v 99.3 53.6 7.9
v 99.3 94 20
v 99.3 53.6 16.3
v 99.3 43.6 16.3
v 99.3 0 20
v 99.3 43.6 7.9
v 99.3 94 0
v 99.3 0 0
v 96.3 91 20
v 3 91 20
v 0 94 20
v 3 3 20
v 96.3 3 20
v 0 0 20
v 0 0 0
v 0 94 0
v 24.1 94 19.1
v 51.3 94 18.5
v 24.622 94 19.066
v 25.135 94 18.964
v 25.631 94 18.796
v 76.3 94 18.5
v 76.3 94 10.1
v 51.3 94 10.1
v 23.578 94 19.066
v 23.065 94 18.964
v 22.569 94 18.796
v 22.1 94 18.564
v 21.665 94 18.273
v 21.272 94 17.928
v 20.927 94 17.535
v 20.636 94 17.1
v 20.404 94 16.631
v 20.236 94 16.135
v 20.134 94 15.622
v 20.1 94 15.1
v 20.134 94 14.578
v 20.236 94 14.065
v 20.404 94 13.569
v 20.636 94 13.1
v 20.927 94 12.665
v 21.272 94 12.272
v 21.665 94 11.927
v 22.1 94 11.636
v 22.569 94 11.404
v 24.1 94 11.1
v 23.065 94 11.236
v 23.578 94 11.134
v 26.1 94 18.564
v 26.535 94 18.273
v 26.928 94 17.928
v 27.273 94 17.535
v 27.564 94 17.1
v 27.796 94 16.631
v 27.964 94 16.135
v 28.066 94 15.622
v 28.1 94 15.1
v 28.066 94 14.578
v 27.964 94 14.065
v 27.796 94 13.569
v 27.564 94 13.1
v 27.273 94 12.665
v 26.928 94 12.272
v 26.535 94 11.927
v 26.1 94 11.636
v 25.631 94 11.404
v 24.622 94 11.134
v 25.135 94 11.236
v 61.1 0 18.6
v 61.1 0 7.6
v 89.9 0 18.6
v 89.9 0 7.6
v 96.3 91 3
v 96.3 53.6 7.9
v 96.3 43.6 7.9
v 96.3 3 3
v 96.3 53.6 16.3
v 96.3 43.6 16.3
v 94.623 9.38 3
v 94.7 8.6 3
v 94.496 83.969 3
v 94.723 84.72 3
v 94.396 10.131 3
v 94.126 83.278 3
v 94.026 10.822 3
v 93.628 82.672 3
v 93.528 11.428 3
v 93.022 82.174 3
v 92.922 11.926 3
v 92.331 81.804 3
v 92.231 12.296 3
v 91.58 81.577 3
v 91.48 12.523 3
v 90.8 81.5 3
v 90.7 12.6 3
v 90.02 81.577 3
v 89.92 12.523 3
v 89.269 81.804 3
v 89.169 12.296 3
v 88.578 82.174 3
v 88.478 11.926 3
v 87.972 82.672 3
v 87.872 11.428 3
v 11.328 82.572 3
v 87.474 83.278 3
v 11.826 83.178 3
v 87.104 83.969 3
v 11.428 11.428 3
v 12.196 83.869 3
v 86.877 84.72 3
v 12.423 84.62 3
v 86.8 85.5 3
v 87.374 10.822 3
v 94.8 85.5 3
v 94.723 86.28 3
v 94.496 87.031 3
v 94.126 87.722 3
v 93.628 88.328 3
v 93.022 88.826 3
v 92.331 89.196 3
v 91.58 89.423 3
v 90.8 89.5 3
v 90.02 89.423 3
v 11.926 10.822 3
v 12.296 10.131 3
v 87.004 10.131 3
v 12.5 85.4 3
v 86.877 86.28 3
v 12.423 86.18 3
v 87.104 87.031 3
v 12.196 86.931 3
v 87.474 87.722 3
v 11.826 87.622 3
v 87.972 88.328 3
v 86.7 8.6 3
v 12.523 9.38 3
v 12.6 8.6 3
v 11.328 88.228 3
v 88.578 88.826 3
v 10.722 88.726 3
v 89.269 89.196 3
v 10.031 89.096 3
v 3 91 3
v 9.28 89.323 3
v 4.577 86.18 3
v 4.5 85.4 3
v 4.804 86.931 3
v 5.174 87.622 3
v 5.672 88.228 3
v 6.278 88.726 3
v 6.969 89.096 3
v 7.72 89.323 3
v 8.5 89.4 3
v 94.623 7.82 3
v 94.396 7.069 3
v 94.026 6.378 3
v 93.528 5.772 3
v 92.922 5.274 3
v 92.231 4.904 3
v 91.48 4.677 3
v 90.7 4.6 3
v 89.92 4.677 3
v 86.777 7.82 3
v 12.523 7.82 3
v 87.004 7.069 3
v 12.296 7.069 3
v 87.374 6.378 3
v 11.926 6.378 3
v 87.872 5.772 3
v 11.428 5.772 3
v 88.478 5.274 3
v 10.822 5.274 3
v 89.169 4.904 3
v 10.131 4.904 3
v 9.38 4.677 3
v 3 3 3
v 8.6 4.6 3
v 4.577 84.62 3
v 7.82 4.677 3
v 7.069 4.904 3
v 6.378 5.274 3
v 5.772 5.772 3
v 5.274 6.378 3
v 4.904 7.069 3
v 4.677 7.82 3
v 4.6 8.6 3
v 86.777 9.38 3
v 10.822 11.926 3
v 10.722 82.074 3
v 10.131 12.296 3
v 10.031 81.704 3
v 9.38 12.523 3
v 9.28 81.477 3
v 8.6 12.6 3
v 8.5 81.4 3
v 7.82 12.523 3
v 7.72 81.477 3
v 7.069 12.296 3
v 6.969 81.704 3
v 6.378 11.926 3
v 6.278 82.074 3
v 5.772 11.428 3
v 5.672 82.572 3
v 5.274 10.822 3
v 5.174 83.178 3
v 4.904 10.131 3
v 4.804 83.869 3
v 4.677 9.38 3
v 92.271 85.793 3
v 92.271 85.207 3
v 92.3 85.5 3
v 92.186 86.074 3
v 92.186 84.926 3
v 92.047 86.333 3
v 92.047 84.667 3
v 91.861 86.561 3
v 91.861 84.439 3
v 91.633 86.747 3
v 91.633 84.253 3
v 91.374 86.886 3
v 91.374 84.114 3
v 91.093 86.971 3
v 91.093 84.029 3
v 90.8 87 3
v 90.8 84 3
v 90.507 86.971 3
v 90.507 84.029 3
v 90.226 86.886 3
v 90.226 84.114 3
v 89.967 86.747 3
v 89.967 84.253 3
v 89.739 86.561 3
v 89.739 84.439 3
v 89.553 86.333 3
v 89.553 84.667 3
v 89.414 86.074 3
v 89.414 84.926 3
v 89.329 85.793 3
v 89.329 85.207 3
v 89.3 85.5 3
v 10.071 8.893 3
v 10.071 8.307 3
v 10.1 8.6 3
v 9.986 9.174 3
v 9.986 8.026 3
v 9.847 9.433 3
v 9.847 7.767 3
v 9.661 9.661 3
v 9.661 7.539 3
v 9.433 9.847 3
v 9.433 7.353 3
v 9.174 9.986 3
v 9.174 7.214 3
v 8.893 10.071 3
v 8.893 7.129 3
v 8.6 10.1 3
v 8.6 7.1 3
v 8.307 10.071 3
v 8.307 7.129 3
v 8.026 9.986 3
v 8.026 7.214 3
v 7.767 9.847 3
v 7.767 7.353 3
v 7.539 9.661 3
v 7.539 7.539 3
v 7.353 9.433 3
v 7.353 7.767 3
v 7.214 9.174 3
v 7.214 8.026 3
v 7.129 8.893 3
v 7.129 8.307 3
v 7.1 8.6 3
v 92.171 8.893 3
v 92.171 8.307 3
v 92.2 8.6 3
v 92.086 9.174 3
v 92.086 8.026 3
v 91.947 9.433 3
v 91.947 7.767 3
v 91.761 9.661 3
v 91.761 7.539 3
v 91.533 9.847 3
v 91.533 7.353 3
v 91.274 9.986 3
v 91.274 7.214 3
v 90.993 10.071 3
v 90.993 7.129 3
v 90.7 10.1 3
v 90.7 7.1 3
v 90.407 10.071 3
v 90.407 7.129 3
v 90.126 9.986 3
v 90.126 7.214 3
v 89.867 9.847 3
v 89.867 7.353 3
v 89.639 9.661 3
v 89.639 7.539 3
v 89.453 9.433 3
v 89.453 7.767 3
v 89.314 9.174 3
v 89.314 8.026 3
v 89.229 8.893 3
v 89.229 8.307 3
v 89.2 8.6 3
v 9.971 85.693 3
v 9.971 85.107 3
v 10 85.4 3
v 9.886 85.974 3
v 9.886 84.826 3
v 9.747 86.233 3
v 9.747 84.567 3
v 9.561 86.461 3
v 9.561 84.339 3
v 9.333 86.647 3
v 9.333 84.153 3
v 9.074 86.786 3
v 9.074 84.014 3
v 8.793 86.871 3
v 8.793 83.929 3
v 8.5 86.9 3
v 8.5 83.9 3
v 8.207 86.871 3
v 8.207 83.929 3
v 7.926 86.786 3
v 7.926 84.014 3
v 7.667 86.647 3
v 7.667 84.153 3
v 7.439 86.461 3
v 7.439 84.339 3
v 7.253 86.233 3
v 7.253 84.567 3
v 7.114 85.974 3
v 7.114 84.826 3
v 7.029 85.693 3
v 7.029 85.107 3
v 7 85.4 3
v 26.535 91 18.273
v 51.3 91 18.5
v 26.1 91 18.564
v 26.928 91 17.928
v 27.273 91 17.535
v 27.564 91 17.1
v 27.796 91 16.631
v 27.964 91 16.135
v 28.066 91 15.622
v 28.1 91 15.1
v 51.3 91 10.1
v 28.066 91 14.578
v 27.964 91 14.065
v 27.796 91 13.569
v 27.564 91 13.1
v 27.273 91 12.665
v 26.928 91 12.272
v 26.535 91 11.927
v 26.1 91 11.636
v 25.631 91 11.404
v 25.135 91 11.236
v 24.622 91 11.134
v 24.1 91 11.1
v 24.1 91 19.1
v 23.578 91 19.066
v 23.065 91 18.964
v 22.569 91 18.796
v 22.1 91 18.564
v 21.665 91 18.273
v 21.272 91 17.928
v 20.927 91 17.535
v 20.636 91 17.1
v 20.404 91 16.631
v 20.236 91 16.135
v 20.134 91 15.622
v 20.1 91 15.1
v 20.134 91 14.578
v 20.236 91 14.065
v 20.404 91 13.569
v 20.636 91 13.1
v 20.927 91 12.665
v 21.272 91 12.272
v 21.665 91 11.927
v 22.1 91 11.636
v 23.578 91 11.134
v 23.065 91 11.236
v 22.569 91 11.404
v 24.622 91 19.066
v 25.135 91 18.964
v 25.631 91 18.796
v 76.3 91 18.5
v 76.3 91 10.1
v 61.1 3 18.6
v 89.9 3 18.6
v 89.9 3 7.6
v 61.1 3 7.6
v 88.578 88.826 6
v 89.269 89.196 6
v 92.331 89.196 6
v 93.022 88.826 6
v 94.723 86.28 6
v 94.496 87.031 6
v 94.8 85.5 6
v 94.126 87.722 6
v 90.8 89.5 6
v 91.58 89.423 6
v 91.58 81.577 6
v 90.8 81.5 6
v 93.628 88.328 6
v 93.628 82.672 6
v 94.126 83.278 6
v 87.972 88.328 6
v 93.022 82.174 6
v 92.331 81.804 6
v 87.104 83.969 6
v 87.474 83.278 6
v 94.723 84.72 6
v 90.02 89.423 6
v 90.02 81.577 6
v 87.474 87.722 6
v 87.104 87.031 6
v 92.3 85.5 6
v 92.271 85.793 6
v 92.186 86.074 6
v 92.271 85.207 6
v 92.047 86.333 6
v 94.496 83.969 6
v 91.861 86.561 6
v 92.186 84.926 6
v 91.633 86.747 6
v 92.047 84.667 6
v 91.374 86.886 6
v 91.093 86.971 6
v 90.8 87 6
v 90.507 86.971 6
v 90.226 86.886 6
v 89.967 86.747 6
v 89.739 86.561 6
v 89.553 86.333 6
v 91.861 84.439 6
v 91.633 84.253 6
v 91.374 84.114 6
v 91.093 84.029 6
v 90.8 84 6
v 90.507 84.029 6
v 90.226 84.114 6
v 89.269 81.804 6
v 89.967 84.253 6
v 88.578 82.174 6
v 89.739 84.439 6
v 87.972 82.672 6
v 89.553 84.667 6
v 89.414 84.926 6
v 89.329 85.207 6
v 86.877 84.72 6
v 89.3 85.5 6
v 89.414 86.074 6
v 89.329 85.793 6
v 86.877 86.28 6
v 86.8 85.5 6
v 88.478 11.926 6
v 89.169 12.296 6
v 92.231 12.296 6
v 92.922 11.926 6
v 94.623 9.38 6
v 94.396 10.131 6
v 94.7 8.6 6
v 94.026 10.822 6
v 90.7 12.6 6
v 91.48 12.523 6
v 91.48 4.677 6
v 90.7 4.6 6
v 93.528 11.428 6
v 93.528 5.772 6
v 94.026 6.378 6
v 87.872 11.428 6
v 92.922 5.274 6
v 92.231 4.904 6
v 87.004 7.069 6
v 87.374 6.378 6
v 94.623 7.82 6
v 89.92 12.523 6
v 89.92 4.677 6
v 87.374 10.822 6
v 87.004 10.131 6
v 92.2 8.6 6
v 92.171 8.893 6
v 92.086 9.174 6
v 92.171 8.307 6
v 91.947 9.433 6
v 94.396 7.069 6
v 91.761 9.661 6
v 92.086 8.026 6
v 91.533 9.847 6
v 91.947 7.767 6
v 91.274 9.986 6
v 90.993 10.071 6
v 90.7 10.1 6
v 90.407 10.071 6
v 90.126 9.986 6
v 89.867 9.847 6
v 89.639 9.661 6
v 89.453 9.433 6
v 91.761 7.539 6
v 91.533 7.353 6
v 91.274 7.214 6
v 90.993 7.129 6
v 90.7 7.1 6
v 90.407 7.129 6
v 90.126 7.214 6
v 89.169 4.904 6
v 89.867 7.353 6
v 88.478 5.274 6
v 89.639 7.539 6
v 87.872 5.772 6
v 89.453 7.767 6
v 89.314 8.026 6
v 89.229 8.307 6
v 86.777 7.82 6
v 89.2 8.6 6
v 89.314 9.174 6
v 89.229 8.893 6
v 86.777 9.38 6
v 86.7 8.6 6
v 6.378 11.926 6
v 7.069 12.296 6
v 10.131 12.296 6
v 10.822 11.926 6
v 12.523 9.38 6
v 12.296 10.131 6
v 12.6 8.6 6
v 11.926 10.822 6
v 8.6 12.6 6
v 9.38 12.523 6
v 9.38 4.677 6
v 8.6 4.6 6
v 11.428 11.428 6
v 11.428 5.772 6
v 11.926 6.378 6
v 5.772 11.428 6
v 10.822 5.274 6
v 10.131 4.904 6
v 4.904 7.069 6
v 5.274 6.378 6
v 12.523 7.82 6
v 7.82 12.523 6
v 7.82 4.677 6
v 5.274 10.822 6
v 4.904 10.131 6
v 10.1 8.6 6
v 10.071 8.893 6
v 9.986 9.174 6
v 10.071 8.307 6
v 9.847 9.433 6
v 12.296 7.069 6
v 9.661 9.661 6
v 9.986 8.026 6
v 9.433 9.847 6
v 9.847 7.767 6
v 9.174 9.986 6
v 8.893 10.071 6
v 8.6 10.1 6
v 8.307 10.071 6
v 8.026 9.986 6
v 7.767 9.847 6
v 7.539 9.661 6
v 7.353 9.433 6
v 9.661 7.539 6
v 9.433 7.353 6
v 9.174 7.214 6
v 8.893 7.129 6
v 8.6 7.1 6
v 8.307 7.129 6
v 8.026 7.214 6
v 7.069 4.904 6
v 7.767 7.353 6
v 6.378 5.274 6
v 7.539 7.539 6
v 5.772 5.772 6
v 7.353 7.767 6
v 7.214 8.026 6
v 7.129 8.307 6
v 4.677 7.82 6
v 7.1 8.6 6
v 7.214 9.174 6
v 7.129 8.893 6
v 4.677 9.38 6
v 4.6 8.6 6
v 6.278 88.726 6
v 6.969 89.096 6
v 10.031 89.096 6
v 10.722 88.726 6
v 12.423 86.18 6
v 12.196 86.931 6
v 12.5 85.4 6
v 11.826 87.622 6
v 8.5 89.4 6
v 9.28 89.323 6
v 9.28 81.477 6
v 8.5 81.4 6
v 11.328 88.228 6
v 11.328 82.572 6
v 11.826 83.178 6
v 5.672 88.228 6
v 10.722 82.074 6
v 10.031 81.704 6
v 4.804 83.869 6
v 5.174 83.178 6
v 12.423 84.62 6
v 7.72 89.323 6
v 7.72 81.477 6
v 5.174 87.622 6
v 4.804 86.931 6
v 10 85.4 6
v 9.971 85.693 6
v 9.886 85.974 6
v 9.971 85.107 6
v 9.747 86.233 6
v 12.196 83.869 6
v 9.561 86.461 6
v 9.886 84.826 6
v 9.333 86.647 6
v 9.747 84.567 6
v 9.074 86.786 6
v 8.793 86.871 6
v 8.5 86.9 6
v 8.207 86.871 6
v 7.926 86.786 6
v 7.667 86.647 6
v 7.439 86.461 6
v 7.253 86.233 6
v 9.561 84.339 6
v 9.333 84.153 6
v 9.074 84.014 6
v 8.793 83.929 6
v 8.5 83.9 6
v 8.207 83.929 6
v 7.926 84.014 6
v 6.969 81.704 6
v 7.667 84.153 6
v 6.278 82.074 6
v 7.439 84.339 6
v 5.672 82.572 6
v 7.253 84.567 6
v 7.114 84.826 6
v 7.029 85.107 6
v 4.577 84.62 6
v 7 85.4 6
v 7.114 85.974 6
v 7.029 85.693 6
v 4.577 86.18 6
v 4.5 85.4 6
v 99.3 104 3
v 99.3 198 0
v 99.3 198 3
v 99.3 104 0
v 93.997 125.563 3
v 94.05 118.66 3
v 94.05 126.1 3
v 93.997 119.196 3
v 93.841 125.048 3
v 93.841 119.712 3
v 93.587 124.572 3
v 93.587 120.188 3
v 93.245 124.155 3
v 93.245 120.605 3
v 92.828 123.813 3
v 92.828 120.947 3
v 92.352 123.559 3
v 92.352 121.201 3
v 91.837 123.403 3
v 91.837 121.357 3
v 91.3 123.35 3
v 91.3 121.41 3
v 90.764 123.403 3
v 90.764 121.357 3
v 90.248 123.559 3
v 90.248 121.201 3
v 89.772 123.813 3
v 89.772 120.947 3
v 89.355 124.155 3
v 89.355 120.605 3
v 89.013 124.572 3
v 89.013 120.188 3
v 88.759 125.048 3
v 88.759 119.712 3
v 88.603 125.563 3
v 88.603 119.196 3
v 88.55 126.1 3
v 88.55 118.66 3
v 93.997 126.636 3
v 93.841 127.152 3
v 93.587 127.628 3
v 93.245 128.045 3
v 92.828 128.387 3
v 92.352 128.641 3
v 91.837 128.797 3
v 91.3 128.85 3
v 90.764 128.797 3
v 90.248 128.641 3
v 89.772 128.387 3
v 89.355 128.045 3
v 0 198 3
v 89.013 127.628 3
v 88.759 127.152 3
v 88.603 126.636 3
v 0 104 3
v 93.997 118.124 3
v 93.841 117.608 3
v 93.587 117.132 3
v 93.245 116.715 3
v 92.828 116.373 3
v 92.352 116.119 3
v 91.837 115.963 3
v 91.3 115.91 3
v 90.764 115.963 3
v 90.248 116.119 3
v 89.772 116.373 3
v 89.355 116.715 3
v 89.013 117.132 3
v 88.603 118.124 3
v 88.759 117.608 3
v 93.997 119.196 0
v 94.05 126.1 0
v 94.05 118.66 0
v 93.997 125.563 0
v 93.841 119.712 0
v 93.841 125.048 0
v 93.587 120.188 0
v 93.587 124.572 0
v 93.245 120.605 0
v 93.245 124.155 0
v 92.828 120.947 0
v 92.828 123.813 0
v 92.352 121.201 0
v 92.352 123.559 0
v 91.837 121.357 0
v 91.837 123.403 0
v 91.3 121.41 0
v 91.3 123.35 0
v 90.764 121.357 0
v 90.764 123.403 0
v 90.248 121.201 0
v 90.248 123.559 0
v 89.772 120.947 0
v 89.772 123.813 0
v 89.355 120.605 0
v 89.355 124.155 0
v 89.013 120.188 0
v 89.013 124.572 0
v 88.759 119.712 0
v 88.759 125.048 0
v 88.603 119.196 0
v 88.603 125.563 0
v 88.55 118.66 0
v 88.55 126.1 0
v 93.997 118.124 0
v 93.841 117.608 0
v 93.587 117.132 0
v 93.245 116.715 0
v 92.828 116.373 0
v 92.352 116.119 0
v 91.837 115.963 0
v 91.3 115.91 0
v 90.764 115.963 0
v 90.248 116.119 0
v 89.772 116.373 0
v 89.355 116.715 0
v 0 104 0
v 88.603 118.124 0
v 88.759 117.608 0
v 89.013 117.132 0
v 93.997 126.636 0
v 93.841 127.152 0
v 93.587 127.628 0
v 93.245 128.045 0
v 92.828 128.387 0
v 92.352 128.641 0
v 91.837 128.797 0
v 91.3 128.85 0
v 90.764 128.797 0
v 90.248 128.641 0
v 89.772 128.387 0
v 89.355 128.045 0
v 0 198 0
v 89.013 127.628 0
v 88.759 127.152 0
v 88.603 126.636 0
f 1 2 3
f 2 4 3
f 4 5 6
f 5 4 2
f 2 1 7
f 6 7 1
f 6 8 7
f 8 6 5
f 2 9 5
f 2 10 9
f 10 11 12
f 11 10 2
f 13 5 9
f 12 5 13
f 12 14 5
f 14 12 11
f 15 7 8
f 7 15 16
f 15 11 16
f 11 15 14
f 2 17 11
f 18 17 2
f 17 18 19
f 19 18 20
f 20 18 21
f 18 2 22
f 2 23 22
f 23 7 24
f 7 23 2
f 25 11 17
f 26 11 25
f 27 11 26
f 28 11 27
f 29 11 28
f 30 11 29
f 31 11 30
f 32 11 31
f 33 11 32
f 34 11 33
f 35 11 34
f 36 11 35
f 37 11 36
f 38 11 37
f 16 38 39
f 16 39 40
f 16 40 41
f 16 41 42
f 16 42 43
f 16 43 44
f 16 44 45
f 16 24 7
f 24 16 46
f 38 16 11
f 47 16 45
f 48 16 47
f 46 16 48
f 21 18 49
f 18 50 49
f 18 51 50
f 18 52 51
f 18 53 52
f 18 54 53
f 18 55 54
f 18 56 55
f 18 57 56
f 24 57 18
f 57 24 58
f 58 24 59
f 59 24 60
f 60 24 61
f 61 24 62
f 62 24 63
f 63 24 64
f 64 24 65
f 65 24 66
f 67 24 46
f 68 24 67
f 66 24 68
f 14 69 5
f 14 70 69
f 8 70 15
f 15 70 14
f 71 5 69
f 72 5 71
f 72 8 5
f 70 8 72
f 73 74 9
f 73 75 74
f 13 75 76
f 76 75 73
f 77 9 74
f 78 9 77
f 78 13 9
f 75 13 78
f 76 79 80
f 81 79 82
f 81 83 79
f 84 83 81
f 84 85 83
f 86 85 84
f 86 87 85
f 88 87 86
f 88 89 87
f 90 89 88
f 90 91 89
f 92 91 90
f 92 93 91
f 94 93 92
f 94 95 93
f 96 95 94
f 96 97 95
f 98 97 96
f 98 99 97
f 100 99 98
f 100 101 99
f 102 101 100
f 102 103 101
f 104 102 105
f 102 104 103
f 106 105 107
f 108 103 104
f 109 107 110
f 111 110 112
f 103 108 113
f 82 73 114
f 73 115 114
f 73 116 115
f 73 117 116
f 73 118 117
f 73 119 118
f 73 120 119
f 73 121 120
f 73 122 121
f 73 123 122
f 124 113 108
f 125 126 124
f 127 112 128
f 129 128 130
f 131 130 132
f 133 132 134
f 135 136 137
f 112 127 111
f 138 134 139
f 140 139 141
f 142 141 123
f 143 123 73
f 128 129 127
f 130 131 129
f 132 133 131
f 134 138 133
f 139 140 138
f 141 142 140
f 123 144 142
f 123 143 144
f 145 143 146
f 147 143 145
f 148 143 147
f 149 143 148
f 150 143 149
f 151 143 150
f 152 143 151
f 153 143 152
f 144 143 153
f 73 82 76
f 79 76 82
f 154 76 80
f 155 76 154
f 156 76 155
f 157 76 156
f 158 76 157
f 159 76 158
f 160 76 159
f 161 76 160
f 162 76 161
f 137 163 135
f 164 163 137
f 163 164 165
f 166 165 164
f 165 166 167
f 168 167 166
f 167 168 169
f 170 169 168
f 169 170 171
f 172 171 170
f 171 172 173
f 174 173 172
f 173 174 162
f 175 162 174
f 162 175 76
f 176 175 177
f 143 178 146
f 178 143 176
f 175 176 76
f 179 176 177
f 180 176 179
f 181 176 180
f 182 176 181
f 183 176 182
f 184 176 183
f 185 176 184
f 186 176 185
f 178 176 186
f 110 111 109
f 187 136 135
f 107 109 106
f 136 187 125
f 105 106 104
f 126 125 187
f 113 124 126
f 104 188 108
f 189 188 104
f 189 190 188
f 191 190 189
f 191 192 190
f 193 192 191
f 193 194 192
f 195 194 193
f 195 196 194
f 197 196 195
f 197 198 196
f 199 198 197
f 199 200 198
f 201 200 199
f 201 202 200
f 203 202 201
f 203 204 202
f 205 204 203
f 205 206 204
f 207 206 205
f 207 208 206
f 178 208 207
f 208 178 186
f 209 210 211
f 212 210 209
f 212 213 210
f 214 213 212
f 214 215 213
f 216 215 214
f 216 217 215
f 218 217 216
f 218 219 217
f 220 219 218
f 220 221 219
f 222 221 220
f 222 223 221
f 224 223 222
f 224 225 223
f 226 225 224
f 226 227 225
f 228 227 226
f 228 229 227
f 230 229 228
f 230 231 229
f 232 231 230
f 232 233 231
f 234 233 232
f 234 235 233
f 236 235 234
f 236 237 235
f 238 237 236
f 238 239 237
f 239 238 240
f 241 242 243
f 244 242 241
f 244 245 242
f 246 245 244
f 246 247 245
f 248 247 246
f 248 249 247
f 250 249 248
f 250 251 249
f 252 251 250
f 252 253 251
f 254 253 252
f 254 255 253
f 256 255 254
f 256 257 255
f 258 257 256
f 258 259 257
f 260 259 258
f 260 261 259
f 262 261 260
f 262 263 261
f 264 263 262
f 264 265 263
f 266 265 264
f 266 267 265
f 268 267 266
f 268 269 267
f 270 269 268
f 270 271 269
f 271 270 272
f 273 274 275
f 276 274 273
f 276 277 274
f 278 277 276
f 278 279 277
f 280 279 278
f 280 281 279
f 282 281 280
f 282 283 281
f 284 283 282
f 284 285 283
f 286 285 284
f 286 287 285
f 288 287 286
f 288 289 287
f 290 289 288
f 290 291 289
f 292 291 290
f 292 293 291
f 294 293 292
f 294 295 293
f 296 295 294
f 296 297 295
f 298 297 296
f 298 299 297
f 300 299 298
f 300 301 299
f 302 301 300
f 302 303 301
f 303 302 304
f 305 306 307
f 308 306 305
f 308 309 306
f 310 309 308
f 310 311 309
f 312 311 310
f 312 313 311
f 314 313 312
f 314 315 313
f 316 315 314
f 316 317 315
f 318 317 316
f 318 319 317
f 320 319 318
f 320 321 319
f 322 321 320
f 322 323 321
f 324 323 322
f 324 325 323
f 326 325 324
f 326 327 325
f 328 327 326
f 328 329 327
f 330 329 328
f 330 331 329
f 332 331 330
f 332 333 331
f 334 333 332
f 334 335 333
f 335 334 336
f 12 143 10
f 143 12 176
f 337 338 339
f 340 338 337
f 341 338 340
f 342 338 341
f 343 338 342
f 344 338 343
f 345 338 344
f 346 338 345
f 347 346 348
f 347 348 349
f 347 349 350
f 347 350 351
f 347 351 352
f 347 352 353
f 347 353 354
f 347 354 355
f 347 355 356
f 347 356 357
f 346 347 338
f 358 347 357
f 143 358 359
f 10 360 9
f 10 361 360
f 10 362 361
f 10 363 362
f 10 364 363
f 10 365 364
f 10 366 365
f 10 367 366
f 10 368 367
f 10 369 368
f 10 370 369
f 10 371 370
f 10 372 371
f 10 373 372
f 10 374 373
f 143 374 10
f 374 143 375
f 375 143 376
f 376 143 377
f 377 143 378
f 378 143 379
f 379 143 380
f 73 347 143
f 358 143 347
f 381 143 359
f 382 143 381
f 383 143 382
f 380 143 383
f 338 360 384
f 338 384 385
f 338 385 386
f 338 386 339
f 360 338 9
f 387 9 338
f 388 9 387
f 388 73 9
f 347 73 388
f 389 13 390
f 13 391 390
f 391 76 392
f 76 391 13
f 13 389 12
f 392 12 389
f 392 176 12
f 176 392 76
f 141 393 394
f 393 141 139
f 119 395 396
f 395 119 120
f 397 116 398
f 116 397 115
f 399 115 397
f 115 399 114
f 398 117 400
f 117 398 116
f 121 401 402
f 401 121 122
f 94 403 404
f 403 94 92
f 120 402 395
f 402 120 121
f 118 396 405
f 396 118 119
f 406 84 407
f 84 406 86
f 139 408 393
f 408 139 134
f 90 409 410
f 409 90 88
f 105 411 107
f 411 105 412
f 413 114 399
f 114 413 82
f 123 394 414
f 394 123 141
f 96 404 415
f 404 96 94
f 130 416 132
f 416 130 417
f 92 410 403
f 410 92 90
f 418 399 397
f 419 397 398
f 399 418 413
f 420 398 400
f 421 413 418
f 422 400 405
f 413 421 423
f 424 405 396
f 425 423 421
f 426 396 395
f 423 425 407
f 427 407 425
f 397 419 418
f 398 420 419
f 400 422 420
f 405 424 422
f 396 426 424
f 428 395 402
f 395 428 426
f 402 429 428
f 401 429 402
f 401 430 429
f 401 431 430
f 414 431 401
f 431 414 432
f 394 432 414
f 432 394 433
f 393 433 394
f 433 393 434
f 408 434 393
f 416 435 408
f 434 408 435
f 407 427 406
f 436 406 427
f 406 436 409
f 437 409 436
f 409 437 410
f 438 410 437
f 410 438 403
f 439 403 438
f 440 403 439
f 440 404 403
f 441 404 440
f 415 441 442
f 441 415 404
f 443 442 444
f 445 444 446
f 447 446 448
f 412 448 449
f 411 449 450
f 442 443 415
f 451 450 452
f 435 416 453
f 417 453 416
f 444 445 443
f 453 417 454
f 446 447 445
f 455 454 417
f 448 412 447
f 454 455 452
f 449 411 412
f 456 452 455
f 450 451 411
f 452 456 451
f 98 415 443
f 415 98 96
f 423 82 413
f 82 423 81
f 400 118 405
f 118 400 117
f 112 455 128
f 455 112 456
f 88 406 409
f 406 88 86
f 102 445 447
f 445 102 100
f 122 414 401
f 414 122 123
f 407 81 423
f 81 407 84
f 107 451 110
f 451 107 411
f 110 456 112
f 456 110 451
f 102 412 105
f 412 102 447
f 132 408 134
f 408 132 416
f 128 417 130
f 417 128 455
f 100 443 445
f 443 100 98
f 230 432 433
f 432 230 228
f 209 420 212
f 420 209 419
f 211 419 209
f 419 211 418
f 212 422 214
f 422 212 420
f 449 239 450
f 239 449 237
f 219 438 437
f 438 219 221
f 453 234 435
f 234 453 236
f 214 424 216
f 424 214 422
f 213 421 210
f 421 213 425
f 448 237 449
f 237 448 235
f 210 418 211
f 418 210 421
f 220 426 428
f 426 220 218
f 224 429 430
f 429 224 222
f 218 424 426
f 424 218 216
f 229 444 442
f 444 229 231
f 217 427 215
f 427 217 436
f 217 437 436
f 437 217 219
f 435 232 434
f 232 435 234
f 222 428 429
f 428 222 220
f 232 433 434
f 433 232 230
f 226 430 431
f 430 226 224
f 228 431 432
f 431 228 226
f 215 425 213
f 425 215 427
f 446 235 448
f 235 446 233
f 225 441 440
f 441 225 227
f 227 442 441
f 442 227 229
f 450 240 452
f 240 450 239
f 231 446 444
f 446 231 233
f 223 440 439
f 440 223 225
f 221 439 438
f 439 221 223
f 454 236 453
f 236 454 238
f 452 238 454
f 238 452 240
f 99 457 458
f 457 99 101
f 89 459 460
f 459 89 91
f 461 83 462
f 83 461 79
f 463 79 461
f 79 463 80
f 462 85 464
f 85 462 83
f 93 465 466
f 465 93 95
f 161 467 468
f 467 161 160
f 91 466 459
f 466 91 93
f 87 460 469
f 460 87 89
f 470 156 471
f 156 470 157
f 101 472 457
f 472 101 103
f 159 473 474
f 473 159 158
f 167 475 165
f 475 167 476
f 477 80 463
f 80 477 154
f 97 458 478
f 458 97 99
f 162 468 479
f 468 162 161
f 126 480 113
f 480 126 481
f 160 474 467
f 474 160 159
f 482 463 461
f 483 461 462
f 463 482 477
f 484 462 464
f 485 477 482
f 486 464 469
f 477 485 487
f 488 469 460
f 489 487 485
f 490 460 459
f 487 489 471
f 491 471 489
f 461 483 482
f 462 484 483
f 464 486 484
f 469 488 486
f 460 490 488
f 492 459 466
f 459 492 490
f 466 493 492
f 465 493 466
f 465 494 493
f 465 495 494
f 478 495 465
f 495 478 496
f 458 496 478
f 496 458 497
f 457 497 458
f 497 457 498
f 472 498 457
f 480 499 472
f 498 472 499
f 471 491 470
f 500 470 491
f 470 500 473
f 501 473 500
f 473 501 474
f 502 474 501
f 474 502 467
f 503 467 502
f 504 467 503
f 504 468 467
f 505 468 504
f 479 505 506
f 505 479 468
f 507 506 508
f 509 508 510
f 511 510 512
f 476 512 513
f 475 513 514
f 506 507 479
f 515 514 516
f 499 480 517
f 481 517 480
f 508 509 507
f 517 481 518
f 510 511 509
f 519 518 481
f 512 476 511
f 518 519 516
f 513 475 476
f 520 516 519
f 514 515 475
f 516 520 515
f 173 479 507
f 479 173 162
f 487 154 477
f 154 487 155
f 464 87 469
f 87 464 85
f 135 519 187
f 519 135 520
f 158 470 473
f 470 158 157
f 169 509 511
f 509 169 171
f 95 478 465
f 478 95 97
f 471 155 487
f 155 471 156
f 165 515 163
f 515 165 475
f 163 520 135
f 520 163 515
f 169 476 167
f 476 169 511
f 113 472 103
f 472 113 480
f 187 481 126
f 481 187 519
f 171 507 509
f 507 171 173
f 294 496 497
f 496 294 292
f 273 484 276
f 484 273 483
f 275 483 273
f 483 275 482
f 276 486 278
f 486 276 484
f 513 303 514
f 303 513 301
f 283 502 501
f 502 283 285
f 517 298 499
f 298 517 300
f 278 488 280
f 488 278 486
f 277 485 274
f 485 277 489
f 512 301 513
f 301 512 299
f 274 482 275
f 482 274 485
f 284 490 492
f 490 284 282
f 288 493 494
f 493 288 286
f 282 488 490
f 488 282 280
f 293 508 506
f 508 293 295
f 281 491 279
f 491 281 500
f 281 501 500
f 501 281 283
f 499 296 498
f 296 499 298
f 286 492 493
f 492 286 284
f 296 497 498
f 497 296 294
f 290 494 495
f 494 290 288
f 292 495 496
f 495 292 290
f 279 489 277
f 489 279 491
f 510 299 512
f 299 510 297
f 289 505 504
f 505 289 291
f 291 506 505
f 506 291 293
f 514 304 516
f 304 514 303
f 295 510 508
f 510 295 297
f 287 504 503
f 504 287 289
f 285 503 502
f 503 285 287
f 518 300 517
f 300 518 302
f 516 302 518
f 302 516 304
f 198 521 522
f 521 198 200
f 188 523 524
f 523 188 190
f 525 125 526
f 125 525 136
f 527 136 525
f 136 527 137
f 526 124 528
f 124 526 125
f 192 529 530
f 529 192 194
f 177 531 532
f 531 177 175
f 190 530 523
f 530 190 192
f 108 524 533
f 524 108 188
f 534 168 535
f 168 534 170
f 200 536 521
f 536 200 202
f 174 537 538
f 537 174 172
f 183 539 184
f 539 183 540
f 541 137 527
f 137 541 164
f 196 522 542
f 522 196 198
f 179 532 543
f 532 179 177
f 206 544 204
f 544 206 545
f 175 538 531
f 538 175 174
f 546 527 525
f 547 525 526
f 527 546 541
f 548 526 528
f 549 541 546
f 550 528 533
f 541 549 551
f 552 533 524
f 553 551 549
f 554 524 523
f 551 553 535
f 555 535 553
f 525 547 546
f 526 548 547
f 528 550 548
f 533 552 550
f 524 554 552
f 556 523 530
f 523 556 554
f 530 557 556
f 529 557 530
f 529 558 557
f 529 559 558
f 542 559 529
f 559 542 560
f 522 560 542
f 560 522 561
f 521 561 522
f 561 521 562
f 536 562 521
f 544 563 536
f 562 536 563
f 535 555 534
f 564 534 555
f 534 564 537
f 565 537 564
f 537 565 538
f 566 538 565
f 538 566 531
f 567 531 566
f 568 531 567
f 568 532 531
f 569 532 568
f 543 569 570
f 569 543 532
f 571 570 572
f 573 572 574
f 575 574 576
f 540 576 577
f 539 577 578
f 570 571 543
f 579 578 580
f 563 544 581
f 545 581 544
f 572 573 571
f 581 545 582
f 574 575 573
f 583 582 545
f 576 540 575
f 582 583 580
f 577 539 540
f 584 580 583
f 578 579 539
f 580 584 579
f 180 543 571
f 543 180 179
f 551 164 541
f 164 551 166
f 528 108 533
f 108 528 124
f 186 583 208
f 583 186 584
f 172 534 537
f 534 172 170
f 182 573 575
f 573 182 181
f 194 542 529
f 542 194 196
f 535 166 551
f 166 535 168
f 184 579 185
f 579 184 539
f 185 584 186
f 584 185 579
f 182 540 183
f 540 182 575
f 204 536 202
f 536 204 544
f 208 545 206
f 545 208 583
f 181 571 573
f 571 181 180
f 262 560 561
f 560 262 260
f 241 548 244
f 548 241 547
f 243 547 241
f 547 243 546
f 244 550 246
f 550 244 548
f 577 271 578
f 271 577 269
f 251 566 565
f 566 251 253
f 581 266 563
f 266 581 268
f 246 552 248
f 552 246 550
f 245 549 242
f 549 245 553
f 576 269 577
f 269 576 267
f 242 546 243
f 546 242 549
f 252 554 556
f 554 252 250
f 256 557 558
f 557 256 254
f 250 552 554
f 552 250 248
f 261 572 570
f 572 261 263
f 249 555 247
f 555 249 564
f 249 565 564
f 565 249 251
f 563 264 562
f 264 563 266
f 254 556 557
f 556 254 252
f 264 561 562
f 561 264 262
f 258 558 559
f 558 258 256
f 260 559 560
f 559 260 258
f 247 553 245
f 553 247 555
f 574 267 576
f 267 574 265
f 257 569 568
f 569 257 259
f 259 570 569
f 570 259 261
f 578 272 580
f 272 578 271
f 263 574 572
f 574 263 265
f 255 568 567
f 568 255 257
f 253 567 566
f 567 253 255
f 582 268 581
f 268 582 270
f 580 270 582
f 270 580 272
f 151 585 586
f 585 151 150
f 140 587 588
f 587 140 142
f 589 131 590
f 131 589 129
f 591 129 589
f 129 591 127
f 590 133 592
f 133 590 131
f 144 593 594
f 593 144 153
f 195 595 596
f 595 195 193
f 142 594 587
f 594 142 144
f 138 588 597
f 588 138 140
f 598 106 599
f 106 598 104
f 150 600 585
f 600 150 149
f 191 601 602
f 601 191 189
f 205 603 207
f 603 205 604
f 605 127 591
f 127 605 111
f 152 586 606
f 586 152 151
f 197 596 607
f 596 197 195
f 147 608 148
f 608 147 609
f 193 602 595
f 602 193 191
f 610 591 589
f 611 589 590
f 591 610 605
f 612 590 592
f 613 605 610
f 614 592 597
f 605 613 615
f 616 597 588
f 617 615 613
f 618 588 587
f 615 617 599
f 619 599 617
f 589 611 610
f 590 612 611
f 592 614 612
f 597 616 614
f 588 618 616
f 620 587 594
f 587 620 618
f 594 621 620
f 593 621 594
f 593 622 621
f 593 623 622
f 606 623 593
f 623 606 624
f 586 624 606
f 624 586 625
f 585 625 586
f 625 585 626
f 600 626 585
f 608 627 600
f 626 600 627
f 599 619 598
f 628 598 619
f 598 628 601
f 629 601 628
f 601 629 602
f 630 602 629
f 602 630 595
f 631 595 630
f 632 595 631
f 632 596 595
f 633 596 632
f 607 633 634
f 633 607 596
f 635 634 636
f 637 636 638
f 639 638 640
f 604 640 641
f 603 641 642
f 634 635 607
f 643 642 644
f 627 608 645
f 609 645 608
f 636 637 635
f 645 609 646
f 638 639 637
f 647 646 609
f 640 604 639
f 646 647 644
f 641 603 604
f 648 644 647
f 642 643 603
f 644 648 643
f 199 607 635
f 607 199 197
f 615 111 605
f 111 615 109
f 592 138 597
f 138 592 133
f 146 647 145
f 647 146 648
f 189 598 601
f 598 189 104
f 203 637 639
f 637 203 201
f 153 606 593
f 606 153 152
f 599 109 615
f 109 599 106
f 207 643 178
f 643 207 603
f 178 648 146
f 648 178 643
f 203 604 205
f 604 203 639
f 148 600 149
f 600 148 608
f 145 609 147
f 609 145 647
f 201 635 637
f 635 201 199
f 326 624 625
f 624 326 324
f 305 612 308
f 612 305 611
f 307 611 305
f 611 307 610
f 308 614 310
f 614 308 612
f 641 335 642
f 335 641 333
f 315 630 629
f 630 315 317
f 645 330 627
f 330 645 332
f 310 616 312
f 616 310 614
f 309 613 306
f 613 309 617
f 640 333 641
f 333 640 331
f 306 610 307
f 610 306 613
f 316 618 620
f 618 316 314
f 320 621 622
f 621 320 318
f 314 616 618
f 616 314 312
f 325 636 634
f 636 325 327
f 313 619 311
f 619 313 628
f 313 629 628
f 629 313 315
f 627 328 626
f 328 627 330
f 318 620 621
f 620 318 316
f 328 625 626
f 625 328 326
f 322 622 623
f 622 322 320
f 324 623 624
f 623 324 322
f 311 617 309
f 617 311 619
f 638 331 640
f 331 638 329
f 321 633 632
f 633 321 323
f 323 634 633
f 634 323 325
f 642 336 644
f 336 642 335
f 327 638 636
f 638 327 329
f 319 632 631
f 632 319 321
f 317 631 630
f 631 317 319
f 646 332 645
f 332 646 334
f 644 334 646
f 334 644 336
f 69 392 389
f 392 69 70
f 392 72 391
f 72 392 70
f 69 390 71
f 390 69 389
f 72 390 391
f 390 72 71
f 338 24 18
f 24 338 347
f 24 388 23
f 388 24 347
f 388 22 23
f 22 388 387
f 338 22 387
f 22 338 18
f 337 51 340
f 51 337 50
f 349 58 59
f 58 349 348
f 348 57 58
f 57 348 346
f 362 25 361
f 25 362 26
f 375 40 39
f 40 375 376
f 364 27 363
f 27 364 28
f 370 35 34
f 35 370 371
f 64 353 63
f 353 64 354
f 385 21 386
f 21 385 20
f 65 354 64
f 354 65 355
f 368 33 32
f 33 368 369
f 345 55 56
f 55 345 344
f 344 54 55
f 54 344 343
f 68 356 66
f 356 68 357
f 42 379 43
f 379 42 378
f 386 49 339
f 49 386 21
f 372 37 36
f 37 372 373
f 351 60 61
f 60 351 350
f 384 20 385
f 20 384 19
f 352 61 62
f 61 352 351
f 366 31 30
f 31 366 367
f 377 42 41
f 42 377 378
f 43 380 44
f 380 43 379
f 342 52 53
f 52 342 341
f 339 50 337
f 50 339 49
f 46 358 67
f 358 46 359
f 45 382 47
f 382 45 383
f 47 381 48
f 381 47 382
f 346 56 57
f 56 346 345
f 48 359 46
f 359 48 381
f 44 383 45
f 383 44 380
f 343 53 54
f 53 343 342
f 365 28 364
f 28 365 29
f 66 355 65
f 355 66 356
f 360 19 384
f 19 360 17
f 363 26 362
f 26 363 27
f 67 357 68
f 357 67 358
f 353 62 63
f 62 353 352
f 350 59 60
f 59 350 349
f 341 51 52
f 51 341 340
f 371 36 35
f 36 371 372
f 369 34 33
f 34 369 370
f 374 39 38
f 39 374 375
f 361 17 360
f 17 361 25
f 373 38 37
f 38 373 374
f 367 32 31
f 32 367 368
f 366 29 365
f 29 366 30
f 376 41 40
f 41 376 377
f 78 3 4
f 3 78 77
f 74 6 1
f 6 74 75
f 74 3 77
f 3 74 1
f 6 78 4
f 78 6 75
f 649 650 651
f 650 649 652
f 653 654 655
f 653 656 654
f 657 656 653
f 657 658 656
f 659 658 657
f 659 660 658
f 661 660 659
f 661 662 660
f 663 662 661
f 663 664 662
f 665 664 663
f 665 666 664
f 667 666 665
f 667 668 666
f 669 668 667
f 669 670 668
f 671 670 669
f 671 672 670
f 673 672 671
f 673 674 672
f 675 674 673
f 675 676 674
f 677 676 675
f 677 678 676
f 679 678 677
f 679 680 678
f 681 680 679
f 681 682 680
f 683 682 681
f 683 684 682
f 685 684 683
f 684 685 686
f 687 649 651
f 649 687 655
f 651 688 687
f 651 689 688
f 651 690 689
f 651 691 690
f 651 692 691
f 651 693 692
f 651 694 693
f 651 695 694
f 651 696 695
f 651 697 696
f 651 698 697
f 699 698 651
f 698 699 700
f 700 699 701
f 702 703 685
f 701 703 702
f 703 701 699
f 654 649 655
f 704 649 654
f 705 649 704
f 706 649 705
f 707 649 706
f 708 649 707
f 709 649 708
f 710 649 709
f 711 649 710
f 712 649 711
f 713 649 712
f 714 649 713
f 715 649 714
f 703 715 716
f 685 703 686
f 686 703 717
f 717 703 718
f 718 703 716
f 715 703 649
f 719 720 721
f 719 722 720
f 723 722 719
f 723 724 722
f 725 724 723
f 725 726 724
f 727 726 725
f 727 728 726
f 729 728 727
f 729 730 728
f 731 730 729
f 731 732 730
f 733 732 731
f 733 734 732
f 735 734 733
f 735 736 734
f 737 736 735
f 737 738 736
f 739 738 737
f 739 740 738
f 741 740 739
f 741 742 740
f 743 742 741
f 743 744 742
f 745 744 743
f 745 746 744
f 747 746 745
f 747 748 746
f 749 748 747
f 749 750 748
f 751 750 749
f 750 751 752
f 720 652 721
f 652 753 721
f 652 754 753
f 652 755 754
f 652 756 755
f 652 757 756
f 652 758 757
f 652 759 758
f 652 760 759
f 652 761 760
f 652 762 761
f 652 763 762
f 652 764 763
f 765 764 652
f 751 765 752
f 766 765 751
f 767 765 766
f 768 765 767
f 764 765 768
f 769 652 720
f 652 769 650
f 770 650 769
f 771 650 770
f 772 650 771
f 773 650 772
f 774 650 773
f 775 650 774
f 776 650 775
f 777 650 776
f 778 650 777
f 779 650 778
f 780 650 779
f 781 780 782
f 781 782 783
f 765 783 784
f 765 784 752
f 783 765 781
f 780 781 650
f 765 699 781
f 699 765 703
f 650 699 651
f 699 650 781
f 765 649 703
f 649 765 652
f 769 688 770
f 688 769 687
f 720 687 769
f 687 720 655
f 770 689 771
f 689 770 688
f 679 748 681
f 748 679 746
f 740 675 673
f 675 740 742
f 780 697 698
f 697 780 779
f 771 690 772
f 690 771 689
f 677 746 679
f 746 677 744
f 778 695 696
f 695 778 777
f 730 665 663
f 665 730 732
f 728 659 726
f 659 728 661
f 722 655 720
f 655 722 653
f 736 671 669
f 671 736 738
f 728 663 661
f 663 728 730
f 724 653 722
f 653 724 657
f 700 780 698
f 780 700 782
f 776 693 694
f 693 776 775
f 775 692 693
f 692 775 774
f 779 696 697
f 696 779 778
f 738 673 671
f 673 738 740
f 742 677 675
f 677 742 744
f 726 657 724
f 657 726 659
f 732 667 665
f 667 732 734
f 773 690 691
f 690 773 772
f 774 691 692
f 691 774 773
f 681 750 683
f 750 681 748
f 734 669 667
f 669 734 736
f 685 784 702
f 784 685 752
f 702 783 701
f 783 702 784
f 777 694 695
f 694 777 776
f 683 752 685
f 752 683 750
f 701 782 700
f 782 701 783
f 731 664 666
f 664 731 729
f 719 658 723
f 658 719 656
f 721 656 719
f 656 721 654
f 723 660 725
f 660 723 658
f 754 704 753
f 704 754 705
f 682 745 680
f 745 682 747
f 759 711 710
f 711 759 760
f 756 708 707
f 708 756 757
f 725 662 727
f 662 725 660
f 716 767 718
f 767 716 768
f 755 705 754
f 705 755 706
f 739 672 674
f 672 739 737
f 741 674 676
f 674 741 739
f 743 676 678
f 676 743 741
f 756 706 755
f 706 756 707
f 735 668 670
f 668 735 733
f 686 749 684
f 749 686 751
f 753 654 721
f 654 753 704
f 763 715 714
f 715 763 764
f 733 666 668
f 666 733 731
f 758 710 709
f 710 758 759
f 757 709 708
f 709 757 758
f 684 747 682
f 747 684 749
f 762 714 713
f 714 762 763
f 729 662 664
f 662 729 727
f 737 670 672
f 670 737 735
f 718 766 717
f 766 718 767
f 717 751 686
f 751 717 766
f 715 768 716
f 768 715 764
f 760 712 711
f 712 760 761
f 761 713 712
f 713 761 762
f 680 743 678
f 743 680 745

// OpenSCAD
// ============================================================
// Gabinete - ModemEYSE4G_LTE_Cat1_simA7670SA
// Base generada a partir de las coordenadas reales del PCB
// (Modulo_SIMA7670SA.kicad_pcb)
// Sistema de coordenadas: origen en la esquina inferior
// izquierda de la placa (0,0), igual que se referencia en
// la conversacion de diseno.
// ============================================================

// ---------- PARAMETROS DE LA PLACA ----------
board_x = 90.3;         // ancho de la placa (mm)
board_y = 85.0;         // alto de la placa (mm)
board_thickness = 1.6;  // espesor del PCB (mm)

// ---------- PARAMETROS DEL GABINETE ----------
wall = 3.0;             // espesor de pared, hacia afuera (mm) - definido por Damian
floor_thickness = 3.0;  // espesor del piso - ASUNCION: igual al espesor de pared,
                        // confirmar con Damian si debe ser distinto
lid_thickness = 3.0;    // espesor de la tapa superior - definido por Damian
box_ext_height = 20.0;  // altura EXTERIOR de la caja (sin contar la tapa) - definido por Damian
clearance_xy = 1.5;     // holgura alrededor de la placa (mm)

// La placa se apoya con la cara de componentes hacia ARRIBA (+Z), sujeta
// por tornillos insertados desde arriba en H1-H4 hacia parantes que
// suben desde el piso del gabinete. La cara inferior de la placa NO
// tiene componentes (es la cara "back"), asi que este hueco es solo
// la altura estructural del parante, no un espacio para alojar partes.
floor_to_board = 3;

// Todo el resto de la altura interior queda disponible ARRIBA de la
// placa, que es donde estan poblados todos los componentes (incluidos
// U3/U5/U6, que son mas altos que el resto pero siguen mirando hacia
// la tapa, no hacia el piso).

// Altura libre disponible arriba de la placa (donde quedan todos los
// componentes, cara hacia la tapa), calculada automaticamente a partir
// de la altura total exterior fijada:
interior_height = box_ext_height - floor_thickness;
board_to_lid = interior_height - floor_to_board - board_thickness;
// Con box_ext_height=20, floor_thickness=3, floor_to_board=3 y
// board_thickness=1.6, board_to_lid queda en 10.4mm libres para
// componentes - CONFIRMAR que alcanza para la altura real de U3/U5/U6
// (module + lo que tengan nesteado debajo de su cuerpo) antes de imprimir.

// Referencia de altura "piso del PCB" (superficie superior, donde
// asientan los componentes) usada para todos los calados de conectores,
// tal como la definio Damian: piso del gabinete (Z=0) + pared (3mm)
// + teton (floor_to_board) + espesor de PCB (1.6mm).
pcb_top_z = floor_thickness + floor_to_board + board_thickness; // = 7.6mm

// ---------- ESPEJADO EN X ----------
// La placa se coloca con la cara de componentes hacia arriba (+Z),
// pero al hacerlo, el eje X queda invertido respecto a como KiCad
// lo guarda en el archivo (que siempre referencia la vista desde
// arriba mirando el F.Cu tal cual se dibuja en el editor). Por eso
// TODAS las coordenadas X de conectores/holes/LEDs se espejan con
// esta funcion antes de usarse. Las coordenadas "_kicad" que siguen
// abajo son las crudas, tal cual figuran en el .kicad_pcb - no las
// toques a mano, se recalculan solas via mirror_x().
mirror_x = true;
function mx(x) = mirror_x ? (board_x - x) : x;

// ---------- MOUNTING HOLES ----------
// Coordenadas crudas de KiCad (relativas a 0,0 de la placa):
// H1: esquina inferior izquierda, H2: superior izquierda,
// H3: superior derecha, H4: inferior derecha
mount_holes_kicad = [
    [4.0, 81.0],   // H1
    [4.1, 4.1],    // H2
    [86.2, 4.1],   // H3
    [86.3, 80.9]   // H4
];
mount_holes = [ for (p = mount_holes_kicad) [mx(p[0]), p[1]] ];
mount_hole_d = 4.0;     // diametro del taladro NPTH (confirmado en drill file)
standoff_od = 8.0;      // diametro externo del standoff/boss - AJUSTAR a gusto
screw_d = 3.0;          // diametro de tornillo autorroscante - CONFIRMAR con Damian

// ---------- CONECTORES ----------
// Coordenadas X crudas de KiCad, ya pasadas por mx() abajo.
// Cada conector tiene su propia altura de calado en Z, medida desde
// pcb_top_z segun lo definido con Damian.

// J1 y J5 (alimentacion): calado rectangular 20mm ancho. Altura pedida
// originalmente 15mm "desde el piso del PCB", pero eso excedia el
// borde superior de la caja (22.6mm > 20mm de box_ext_height) - Damian
// eligio reducir la altura a lo maximo que entra sin agrandar la caja:
// 11mm, dejando ~1.4mm de margen contra el borde superior.
conn_J1J5_w = 20;
conn_J1J5_h = 11;
conn_J1J5_z = pcb_top_z + conn_J1J5_h/2; // = 13.1mm

conn_J1_terminal = [mx(23.7), conn_J1J5_w, conn_J1J5_h]; // pared trasera (y=0)
conn_J5_barrel   = [mx(14.9), conn_J1J5_w, conn_J1J5_h]; // pared trasera (y=0)

// J4 (SMA): agujero circular de 8mm de diametro, centrado a 7.5mm
// sobre el piso del PCB (dato dado por Damian).
conn_J4_sma_d = 8;
conn_J4_sma_x = mx(70.7);           // pared frontal (y=board_y)
conn_J4_sma_z = pcb_top_z + 7.5;    // = 15.1mm

// J2 (DB9 hembra a 90 grados): calado rectangular. Arranca a 2.5mm
// sobre el piso del PCB y sube 8.4mm (el maximo que entra sin agrandar
// la caja, confirmado por Damian). Ancho tomado de la separacion entre
// tornillos propios del conector (25mm) - ASUNCION, confirmar que el
// ancho real de la carcasa no sea mayor a eso.
conn_J2_w = 25;
conn_J2_h = 8.4;
conn_J2_z_start = pcb_top_z + 2.5;
conn_J2_z = conn_J2_z_start + conn_J2_h/2; // = 14.3mm
conn_J2_db9 = [mx(31.0), conn_J2_w, conn_J2_h]; // pared frontal (y=board_y)

// USB-C de U5 (Black Pill): posicion real confirmada contra el visor 3D.
// El footprint real es "Damian_PCB:Black_Pill_STM32F411"; el conector
// USB esta en el punto local (0,-24) de ese footprint. Con la rotacion
// de U5 (90 grados) y la convencion de giro real de KiCad (confirmada
// empiricamente contra la imagen del visor, no la formula que yo tenia
// asumida antes), la posicion cruda de KiCad da (3.3, 44.1) - cerca del
// borde X=0. Como ese borde queda espejado por mx(), el calado real cae
// sobre la PARED DERECHA del gabinete (no la trasera/frontal), a 44.1mm
// a lo largo de esa pared.
conn_usbc_w = 10;
conn_usbc_h = 5; // banda 5-10mm => 5mm de alto
conn_usbc_z = pcb_top_z + 7.5; // punto medio de la banda 5-10mm = 15.1mm
conn_usbc_y = 44.1; // a lo largo de la pared derecha (coordenada Y real, no se espeja)

// LEDs D2 y D3 - calado en la TAPA superior, no en las paredes.
// Coordenadas X crudas de KiCad, ya pasadas por mx().
led_D2 = [mx(3.5), 17.6];
led_D3 = [mx(3.5), 10.16];
led_hole_d = 5.5; // LED THT de 5mm + holgura - AJUSTAR a gusto (diametro real vs. luz difusa)

// J3 (U.FL) es interno, no necesita corte en el gabinete.

// ============================================================
// MODULOS
// ============================================================

module mounting_boss(h) {
    difference() {
        cylinder(h = h, d = standoff_od, $fn = 32);
        cylinder(h = h + 1, d = screw_d, $fn = 32);
    }
}

// Dimensiones exteriores totales de la caja (usadas tambien por la tapa)
outer_x = board_x + 2 * (wall + clearance_xy);
outer_y = board_y + 2 * (wall + clearance_xy);
offset_x = wall + clearance_xy; // offset del (0,0) de la placa dentro de la caja
offset_y = wall + clearance_xy;

module base_gabinete() {
    difference() {
        union() {
            // Cascaron exterior (piso + paredes), altura EXTERIOR fija = box_ext_height
            difference() {
                cube([outer_x, outer_y, box_ext_height]);
                translate([wall, wall, floor_thickness])
                    cube([outer_x - 2*wall, outer_y - 2*wall,
                          box_ext_height - floor_thickness + 1]);
            }
            // Bosses de montaje, en coordenadas reales de H1-H4
            for (p = mount_holes) {
                translate([p[0] + offset_x, p[1] + offset_y, floor_thickness])
                    mounting_boss(floor_to_board);
            }
        }

        // ---- Calados laterales ----
        // Pared trasera (y=0): J1 y J5
        translate([conn_J1_terminal[0] + offset_x, -1, conn_J1J5_z])
            rotate([-90,0,0])
            linear_extrude(height = wall + 2)
            square([conn_J1_terminal[1], conn_J1_terminal[2]], center = true);

        translate([conn_J5_barrel[0] + offset_x, -1, conn_J1J5_z])
            rotate([-90,0,0])
            linear_extrude(height = wall + 2)
            square([conn_J5_barrel[1], conn_J5_barrel[2]], center = true);

        // Pared frontal (y=outer_y): J2 y J4
        translate([conn_J2_db9[0] + offset_x, outer_y - wall - 1, conn_J2_z])
            rotate([-90,0,0])
            linear_extrude(height = wall + 2)
            square([conn_J2_db9[1], conn_J2_db9[2]], center = true);

        translate([conn_J4_sma_x + offset_x, outer_y - wall - 1, conn_J4_sma_z])
            rotate([-90,0,0])
            cylinder(h = wall + 2, d = conn_J4_sma_d, $fn = 48);

        // USB-C de U5: pared derecha (x = outer_x), a lo largo del eje Y.
        // Uso un cubo simple (mas directo que rotar un extrude) para el
        // corte, ya que esta pared es perpendicular al eje X.
        translate([
            outer_x - wall - 1, conn_usbc_y + offset_y - conn_usbc_w/2,
            conn_usbc_z - conn_J2_db9[2]/2 - 3 ])

        cube([wall + 2, conn_usbc_w, conn_J2_db9[2]]);
    }
}

// Tapa superior: pieza separada, mismas dimensiones XY exteriores que la
// caja, espesor lid_thickness. Se imprime aparte y se apoya sobre el
// borde superior de las paredes.
module tapa() {
    difference() {
        cube([outer_x, outer_y, lid_thickness]);

        // Calados de los LEDs D2 y D3 (posicion real tomada del PCB)
        translate([led_D2[0] + offset_x, led_D2[1] + offset_y, -1])
            cylinder(h = lid_thickness + 2, d = led_hole_d, $fn = 32);
        translate([led_D3[0] + offset_x, led_D3[1] + offset_y, -1])
            cylinder(h = lid_thickness + 2, d = led_hole_d, $fn = 32);
    }
}

// ---- Ensamblado para visualizar ambas piezas juntas ----
base_gabinete();

translate([0, outer_y + 10, 0])  // corrida al costado solo para visualizar separada
    tapa();

// ============================================================
// PENDIENTE / TODO:
// - Confirmar que el ancho real de la carcasa del DB9 (J2) no supere
//   los 25mm que se tomaron de la separacion entre tornillos.
// - Confirmar diametro de tornillo (screw_d) y ajustar standoff_od
// - Definir sistema de cierre entre caja y tapa (encastre/tornillos/
//   simplemente apoyada) - por ahora la tapa es una placa plana lisa
// - Verificar visualmente en OpenSCAD que el calado de USB-C en la
//   pared derecha quedo bien posicionado (no pude renderizarlo yo
//   mismo, no tengo OpenSCAD instalado en este entorno)
// ============================================================
